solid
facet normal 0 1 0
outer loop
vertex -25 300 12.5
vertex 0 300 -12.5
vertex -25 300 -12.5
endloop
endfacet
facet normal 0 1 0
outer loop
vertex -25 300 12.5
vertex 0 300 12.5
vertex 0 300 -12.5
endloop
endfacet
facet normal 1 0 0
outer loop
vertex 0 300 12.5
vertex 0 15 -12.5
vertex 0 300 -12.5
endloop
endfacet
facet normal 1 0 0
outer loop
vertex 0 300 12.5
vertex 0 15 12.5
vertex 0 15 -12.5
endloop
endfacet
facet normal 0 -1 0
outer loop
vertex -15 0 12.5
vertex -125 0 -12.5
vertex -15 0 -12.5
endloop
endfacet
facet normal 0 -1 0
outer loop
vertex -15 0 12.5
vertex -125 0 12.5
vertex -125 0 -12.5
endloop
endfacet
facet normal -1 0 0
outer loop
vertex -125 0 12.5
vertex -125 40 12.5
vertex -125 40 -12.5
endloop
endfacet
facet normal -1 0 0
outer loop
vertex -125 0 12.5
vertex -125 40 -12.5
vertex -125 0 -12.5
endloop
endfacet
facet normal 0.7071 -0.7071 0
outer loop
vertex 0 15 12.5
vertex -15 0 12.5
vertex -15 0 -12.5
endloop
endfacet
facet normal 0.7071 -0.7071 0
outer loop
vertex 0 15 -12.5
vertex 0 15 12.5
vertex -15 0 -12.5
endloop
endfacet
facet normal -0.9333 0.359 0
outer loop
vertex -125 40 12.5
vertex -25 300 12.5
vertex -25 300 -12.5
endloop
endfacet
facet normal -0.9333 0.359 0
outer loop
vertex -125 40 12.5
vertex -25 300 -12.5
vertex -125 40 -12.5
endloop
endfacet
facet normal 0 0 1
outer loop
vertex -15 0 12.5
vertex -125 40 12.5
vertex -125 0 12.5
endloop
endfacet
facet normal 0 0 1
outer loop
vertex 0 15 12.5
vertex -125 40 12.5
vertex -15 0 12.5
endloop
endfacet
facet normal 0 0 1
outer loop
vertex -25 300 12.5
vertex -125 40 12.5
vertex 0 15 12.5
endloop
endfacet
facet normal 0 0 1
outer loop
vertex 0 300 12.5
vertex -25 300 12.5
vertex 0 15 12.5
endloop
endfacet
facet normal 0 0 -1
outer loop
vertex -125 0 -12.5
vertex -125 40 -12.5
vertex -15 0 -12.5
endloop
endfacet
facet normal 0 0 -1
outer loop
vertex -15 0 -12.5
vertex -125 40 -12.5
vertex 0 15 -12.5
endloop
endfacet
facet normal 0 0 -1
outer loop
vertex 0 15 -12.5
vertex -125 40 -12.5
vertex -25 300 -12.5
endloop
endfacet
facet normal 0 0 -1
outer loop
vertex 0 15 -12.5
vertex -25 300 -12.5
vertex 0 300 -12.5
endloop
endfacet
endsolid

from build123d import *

# Parameters (mm, degrees)
EXTRUDE_1_DEPTH = 12.5
CHAMFER_1_SIZE  = 15


with BuildPart() as part:
    # Эскиз1 → Бобышка-Вытянуть1 (new body, symmetric)
    with BuildSketch(Plane.XY):
        Polygon((0, 300), (-25, 300), (-125, 40), (-125, 0), (0, 0), align=None)
    extrude(amount=EXTRUDE_1_DEPTH, both=True)

    # Фаска1
    chamfer_1_edges = [part.edges().sort_by_distance(p)[0] for p in [
        (0, 0, 0),
    ]]
    chamfer(chamfer_1_edges, length=CHAMFER_1_SIZE)


solid = part.part
